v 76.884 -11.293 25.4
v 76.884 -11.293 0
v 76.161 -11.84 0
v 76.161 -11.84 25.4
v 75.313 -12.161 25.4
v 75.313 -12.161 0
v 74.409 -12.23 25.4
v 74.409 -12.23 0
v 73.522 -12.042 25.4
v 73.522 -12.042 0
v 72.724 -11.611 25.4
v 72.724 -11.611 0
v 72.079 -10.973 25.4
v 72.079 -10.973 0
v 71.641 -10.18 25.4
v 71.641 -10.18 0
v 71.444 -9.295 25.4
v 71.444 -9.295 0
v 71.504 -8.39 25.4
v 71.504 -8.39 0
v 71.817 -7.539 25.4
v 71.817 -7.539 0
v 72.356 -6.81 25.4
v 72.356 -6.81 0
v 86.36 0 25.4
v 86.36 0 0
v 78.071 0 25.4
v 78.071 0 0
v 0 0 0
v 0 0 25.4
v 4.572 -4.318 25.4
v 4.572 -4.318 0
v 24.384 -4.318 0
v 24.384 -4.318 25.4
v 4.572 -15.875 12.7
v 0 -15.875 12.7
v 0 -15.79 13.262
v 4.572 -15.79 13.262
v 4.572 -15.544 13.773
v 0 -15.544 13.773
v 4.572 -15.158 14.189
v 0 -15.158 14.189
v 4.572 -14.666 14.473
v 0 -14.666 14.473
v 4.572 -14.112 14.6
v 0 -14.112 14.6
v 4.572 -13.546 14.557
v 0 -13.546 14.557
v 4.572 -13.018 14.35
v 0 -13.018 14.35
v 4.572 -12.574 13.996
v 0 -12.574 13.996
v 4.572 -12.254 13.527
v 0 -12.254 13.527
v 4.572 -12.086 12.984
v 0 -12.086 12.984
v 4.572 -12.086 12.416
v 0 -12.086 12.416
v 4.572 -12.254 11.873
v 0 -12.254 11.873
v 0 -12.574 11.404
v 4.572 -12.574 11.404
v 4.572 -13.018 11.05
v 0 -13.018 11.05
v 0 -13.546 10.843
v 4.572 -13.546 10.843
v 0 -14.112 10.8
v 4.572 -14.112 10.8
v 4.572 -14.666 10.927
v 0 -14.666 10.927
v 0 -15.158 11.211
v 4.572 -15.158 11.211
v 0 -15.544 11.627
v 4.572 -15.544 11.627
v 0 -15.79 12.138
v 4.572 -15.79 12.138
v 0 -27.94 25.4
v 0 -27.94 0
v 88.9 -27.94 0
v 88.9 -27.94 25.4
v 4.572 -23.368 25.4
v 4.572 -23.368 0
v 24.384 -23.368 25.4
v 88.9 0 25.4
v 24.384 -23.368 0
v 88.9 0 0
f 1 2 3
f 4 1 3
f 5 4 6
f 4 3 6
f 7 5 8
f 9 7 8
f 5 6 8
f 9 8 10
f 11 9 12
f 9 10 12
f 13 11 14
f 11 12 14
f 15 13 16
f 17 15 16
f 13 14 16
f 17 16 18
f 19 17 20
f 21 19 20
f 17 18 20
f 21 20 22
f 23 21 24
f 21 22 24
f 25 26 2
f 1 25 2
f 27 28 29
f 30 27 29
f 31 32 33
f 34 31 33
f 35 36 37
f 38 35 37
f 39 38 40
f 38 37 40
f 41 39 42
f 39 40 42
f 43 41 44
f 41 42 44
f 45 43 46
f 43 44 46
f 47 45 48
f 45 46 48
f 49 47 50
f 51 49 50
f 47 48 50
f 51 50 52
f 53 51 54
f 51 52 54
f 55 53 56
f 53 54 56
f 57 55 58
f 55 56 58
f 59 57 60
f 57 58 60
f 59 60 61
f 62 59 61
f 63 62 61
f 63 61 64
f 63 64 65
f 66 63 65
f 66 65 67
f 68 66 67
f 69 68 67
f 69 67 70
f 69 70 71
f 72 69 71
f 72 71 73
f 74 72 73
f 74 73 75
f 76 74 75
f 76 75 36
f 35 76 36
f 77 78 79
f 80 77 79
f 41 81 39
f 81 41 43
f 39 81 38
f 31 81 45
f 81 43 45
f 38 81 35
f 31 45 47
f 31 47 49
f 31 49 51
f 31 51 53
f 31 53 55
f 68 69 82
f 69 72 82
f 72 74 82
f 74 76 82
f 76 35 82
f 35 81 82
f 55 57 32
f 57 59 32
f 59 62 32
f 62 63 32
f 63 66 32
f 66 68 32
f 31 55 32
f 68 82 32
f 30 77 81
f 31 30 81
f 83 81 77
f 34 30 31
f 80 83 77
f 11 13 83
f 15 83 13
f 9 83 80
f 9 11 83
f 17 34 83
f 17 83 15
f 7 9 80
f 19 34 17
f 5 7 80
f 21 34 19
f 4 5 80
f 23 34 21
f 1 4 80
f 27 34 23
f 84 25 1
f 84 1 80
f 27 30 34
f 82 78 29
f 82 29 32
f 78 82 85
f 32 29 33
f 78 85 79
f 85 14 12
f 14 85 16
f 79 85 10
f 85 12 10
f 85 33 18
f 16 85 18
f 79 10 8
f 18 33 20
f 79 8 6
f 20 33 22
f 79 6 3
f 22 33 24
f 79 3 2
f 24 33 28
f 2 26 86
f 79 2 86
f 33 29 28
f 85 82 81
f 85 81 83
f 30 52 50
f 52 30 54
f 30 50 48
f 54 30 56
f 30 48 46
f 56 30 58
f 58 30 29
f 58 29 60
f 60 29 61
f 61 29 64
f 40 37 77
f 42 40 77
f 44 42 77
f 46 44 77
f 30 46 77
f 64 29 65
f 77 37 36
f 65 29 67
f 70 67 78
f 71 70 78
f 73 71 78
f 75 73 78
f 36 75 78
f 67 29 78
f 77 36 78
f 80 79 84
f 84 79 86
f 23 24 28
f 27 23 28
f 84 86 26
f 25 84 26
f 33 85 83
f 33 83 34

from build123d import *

# Parameters (mm, degrees)
F0_W     = 19.812
F0_H     = 19.05
F1_DEPTH = 25.4
F2_R     = 1.905
F3_DEPTH = 7.62


with BuildPart() as f1:
    # F0 (on Top) → F1 (new body)
    with BuildSketch(Plane.XY):
        with BuildLine():
            Line((78.070664, 0), (0, 0))
            Line((0, 0), (0, -27.94))
            Line((0, -27.94), (88.9, -27.94))
            Line((88.9, -27.94), (88.9, 0))
            Line((88.9, 0), (86.36, 0))
            Line((86.36, 0), (76.884093, -11.292947))
            ThreePointArc((76.884093, -11.292947), (72.378782, -11.315446), (72.356282, -6.810135))
            Line((72.356282, -6.810135), (78.070664, 0))
        make_face()
        with Locations((14.478, -13.843)):
            Rectangle(F0_W, F0_H, mode=Mode.SUBTRACT)
    extrude(amount=F1_DEPTH)

    # F2 (on face) → F3 (cut)
    with BuildSketch(Plane(origin=(0, 0, 0), x_dir=(0, -1, 0), z_dir=(-1, 0, 0))):
        with Locations((13.97, 12.7)):
            Circle(F2_R)
    extrude(amount=-F3_DEPTH, mode=Mode.SUBTRACT)


solid = f1.part
